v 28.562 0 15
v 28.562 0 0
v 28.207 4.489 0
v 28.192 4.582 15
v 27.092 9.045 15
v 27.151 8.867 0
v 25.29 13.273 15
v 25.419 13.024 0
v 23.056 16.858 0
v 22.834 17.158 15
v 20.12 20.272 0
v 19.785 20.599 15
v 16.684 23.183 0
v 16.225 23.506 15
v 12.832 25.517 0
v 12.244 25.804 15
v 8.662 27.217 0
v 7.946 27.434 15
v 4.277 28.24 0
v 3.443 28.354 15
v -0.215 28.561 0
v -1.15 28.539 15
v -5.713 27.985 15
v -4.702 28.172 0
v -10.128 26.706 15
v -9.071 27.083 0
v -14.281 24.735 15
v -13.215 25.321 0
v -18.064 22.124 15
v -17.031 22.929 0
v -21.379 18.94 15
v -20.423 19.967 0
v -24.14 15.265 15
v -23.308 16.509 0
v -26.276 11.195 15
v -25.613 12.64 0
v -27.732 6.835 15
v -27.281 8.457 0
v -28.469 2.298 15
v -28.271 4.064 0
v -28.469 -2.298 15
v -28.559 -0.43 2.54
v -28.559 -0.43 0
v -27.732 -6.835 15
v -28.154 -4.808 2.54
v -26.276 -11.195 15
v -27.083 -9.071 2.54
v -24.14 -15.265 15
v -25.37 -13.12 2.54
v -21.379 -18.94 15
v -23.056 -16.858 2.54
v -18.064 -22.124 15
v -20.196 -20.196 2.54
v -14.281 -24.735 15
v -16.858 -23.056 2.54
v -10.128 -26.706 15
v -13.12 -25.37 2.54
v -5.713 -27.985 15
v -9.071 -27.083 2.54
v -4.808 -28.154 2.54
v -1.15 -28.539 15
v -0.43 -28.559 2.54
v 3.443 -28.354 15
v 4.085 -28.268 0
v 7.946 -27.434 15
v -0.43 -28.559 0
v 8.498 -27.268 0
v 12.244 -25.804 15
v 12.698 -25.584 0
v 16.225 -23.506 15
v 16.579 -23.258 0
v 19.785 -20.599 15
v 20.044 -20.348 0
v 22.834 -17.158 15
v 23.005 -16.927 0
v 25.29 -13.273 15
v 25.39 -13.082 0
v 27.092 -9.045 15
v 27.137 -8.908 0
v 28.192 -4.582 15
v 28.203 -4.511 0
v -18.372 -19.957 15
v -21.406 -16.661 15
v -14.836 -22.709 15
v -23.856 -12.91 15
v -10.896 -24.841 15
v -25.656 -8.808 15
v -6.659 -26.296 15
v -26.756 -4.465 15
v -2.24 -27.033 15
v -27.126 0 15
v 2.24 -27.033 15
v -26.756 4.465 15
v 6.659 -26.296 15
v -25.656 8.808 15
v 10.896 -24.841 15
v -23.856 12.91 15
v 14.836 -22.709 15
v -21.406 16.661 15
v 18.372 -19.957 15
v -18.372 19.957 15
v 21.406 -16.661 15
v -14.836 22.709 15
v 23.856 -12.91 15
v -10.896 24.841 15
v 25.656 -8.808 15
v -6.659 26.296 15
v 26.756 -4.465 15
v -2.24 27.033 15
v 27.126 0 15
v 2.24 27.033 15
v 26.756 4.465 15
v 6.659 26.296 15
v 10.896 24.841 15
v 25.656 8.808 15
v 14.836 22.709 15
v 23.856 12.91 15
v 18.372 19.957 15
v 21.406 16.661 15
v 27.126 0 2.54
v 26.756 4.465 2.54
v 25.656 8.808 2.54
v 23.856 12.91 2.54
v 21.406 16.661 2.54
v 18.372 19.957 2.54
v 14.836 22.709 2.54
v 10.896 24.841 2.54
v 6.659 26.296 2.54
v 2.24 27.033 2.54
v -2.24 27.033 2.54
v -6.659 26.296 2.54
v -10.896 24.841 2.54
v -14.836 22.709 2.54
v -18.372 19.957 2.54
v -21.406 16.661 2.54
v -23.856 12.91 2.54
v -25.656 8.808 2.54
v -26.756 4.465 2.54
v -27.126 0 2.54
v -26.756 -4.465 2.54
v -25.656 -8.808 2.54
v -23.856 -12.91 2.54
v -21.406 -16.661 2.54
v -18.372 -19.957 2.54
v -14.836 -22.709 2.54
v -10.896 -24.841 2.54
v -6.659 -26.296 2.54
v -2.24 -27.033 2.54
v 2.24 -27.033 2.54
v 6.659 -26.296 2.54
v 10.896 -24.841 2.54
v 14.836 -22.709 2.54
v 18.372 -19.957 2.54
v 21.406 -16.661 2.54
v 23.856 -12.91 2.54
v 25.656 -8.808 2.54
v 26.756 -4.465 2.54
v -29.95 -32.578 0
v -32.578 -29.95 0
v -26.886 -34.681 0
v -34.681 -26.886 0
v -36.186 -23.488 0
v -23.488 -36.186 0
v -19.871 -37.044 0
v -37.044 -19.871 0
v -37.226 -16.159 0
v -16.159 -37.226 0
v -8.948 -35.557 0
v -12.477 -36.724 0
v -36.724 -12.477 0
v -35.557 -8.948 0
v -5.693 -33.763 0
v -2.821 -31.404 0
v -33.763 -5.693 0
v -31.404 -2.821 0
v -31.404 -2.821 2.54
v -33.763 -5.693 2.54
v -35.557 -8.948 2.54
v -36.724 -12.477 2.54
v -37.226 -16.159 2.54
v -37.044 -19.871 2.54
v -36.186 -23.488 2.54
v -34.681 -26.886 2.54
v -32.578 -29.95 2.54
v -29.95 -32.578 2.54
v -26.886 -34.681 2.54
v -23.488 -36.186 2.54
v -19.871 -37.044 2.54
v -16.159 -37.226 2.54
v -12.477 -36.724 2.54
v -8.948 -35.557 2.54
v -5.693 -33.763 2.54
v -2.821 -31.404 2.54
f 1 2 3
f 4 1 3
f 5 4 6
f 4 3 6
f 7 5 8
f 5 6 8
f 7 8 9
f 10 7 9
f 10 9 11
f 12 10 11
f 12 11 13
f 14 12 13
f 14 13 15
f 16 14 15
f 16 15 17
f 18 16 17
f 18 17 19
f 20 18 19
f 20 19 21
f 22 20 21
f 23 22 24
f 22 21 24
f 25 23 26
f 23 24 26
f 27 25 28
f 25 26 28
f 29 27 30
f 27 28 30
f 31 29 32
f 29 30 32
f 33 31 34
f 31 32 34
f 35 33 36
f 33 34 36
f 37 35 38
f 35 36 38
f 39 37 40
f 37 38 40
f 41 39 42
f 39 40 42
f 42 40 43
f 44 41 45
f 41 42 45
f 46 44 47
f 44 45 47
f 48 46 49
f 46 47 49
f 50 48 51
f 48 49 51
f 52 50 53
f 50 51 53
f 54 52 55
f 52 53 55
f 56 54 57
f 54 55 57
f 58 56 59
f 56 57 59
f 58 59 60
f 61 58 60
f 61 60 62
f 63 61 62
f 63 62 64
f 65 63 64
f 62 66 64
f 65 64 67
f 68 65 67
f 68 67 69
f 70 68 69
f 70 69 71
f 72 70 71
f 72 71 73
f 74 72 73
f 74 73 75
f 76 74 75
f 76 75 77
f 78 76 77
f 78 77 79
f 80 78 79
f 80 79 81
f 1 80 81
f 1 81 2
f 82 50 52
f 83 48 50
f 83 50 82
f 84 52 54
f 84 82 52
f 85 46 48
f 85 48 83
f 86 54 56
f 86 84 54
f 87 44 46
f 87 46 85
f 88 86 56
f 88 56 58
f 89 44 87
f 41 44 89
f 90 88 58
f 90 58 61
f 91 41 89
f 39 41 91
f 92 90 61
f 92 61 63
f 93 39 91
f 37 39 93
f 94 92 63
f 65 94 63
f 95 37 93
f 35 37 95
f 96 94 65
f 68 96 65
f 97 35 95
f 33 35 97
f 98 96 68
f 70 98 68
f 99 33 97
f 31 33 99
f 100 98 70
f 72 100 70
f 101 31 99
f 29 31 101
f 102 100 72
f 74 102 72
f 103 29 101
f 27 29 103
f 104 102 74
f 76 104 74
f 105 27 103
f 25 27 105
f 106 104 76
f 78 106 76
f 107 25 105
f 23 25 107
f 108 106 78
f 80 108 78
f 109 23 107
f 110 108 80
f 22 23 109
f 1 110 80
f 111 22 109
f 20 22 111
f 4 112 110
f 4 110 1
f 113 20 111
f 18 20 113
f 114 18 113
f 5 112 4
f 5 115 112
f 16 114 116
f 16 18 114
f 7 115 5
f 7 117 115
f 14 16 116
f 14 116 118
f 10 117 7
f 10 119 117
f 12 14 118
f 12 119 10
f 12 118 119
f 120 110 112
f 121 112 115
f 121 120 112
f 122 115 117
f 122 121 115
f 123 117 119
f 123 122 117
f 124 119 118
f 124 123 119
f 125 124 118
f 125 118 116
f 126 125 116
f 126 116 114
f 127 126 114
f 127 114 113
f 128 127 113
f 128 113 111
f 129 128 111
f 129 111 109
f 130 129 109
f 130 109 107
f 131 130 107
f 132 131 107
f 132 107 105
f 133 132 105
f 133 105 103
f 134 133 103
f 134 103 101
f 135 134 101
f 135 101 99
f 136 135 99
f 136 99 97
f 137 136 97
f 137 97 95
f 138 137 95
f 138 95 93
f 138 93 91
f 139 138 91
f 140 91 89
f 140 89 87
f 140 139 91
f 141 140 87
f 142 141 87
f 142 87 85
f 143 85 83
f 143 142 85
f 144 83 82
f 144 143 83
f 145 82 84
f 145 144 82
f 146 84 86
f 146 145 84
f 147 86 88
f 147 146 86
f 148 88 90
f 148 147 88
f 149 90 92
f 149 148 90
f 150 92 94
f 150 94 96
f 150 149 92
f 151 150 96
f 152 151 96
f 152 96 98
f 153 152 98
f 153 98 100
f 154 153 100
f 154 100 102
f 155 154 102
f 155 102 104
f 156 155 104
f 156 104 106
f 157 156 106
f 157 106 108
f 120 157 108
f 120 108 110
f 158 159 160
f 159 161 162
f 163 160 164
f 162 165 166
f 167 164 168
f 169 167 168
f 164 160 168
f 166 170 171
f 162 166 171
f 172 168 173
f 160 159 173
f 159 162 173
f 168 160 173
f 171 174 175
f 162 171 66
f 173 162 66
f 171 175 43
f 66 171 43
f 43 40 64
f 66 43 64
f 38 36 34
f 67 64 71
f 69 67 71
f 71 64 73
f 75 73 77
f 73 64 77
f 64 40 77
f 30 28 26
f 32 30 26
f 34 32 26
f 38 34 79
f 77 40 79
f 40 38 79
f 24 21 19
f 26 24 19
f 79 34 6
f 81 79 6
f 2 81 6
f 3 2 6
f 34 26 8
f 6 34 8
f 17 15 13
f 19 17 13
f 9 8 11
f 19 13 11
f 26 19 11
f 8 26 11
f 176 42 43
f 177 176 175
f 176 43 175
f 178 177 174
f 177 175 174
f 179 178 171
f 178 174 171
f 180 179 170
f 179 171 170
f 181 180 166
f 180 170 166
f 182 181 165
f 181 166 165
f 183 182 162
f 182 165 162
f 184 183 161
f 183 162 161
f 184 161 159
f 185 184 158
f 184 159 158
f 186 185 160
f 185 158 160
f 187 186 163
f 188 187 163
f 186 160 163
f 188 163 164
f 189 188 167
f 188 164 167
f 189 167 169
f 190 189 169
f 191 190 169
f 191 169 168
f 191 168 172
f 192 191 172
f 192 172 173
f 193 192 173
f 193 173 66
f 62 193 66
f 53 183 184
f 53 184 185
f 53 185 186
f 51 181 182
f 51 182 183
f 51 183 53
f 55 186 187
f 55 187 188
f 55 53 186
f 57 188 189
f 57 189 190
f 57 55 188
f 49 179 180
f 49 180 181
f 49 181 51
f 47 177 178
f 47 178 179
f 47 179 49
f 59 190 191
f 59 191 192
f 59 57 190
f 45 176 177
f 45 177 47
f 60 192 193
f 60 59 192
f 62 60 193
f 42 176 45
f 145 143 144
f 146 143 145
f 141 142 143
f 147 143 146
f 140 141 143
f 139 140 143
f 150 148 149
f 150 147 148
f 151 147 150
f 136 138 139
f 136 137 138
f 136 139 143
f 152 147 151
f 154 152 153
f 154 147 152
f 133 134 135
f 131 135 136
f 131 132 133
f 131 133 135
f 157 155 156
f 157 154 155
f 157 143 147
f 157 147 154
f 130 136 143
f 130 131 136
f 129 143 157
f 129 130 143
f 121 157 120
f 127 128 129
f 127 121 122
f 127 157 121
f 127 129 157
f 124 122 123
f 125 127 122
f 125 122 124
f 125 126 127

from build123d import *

# Parameters (mm, degrees)
F0_R     = 28.561798
F0_R_2   = 27.125766
F1_DEPTH = 15
F3_DEPTH = 2.54


with BuildPart() as f1:
    # F0 (on Top) → F1 (new body)
    with BuildSketch(Plane.XY):
        Circle(F0_R)
        Circle(F0_R_2, mode=Mode.SUBTRACT)
    extrude(amount=F1_DEPTH)

    # F2 (on Top) → F3 (join)
    with BuildSketch(Plane.XY):
        with BuildLine():
            ThreePointArc((0, -27.9126), (19.737189, -19.737189), (27.9126, 0))
            ThreePointArc((27.9126, 0), (0, 27.9126), (-27.9126, 0))
            ThreePointArc((-27.9126, 0), (-19.737189, -19.737189), (0, -27.9126))
        make_face()
        with BuildLine():
            ThreePointArc((0, -27.9126), (-19.737189, -19.737189), (-27.9126, 0))
            ThreePointArc((-27.9126, 0), (-31.324946, -31.324946), (0, -27.9126))
        make_face()
    extrude(amount=F3_DEPTH)


solid = f1.part
